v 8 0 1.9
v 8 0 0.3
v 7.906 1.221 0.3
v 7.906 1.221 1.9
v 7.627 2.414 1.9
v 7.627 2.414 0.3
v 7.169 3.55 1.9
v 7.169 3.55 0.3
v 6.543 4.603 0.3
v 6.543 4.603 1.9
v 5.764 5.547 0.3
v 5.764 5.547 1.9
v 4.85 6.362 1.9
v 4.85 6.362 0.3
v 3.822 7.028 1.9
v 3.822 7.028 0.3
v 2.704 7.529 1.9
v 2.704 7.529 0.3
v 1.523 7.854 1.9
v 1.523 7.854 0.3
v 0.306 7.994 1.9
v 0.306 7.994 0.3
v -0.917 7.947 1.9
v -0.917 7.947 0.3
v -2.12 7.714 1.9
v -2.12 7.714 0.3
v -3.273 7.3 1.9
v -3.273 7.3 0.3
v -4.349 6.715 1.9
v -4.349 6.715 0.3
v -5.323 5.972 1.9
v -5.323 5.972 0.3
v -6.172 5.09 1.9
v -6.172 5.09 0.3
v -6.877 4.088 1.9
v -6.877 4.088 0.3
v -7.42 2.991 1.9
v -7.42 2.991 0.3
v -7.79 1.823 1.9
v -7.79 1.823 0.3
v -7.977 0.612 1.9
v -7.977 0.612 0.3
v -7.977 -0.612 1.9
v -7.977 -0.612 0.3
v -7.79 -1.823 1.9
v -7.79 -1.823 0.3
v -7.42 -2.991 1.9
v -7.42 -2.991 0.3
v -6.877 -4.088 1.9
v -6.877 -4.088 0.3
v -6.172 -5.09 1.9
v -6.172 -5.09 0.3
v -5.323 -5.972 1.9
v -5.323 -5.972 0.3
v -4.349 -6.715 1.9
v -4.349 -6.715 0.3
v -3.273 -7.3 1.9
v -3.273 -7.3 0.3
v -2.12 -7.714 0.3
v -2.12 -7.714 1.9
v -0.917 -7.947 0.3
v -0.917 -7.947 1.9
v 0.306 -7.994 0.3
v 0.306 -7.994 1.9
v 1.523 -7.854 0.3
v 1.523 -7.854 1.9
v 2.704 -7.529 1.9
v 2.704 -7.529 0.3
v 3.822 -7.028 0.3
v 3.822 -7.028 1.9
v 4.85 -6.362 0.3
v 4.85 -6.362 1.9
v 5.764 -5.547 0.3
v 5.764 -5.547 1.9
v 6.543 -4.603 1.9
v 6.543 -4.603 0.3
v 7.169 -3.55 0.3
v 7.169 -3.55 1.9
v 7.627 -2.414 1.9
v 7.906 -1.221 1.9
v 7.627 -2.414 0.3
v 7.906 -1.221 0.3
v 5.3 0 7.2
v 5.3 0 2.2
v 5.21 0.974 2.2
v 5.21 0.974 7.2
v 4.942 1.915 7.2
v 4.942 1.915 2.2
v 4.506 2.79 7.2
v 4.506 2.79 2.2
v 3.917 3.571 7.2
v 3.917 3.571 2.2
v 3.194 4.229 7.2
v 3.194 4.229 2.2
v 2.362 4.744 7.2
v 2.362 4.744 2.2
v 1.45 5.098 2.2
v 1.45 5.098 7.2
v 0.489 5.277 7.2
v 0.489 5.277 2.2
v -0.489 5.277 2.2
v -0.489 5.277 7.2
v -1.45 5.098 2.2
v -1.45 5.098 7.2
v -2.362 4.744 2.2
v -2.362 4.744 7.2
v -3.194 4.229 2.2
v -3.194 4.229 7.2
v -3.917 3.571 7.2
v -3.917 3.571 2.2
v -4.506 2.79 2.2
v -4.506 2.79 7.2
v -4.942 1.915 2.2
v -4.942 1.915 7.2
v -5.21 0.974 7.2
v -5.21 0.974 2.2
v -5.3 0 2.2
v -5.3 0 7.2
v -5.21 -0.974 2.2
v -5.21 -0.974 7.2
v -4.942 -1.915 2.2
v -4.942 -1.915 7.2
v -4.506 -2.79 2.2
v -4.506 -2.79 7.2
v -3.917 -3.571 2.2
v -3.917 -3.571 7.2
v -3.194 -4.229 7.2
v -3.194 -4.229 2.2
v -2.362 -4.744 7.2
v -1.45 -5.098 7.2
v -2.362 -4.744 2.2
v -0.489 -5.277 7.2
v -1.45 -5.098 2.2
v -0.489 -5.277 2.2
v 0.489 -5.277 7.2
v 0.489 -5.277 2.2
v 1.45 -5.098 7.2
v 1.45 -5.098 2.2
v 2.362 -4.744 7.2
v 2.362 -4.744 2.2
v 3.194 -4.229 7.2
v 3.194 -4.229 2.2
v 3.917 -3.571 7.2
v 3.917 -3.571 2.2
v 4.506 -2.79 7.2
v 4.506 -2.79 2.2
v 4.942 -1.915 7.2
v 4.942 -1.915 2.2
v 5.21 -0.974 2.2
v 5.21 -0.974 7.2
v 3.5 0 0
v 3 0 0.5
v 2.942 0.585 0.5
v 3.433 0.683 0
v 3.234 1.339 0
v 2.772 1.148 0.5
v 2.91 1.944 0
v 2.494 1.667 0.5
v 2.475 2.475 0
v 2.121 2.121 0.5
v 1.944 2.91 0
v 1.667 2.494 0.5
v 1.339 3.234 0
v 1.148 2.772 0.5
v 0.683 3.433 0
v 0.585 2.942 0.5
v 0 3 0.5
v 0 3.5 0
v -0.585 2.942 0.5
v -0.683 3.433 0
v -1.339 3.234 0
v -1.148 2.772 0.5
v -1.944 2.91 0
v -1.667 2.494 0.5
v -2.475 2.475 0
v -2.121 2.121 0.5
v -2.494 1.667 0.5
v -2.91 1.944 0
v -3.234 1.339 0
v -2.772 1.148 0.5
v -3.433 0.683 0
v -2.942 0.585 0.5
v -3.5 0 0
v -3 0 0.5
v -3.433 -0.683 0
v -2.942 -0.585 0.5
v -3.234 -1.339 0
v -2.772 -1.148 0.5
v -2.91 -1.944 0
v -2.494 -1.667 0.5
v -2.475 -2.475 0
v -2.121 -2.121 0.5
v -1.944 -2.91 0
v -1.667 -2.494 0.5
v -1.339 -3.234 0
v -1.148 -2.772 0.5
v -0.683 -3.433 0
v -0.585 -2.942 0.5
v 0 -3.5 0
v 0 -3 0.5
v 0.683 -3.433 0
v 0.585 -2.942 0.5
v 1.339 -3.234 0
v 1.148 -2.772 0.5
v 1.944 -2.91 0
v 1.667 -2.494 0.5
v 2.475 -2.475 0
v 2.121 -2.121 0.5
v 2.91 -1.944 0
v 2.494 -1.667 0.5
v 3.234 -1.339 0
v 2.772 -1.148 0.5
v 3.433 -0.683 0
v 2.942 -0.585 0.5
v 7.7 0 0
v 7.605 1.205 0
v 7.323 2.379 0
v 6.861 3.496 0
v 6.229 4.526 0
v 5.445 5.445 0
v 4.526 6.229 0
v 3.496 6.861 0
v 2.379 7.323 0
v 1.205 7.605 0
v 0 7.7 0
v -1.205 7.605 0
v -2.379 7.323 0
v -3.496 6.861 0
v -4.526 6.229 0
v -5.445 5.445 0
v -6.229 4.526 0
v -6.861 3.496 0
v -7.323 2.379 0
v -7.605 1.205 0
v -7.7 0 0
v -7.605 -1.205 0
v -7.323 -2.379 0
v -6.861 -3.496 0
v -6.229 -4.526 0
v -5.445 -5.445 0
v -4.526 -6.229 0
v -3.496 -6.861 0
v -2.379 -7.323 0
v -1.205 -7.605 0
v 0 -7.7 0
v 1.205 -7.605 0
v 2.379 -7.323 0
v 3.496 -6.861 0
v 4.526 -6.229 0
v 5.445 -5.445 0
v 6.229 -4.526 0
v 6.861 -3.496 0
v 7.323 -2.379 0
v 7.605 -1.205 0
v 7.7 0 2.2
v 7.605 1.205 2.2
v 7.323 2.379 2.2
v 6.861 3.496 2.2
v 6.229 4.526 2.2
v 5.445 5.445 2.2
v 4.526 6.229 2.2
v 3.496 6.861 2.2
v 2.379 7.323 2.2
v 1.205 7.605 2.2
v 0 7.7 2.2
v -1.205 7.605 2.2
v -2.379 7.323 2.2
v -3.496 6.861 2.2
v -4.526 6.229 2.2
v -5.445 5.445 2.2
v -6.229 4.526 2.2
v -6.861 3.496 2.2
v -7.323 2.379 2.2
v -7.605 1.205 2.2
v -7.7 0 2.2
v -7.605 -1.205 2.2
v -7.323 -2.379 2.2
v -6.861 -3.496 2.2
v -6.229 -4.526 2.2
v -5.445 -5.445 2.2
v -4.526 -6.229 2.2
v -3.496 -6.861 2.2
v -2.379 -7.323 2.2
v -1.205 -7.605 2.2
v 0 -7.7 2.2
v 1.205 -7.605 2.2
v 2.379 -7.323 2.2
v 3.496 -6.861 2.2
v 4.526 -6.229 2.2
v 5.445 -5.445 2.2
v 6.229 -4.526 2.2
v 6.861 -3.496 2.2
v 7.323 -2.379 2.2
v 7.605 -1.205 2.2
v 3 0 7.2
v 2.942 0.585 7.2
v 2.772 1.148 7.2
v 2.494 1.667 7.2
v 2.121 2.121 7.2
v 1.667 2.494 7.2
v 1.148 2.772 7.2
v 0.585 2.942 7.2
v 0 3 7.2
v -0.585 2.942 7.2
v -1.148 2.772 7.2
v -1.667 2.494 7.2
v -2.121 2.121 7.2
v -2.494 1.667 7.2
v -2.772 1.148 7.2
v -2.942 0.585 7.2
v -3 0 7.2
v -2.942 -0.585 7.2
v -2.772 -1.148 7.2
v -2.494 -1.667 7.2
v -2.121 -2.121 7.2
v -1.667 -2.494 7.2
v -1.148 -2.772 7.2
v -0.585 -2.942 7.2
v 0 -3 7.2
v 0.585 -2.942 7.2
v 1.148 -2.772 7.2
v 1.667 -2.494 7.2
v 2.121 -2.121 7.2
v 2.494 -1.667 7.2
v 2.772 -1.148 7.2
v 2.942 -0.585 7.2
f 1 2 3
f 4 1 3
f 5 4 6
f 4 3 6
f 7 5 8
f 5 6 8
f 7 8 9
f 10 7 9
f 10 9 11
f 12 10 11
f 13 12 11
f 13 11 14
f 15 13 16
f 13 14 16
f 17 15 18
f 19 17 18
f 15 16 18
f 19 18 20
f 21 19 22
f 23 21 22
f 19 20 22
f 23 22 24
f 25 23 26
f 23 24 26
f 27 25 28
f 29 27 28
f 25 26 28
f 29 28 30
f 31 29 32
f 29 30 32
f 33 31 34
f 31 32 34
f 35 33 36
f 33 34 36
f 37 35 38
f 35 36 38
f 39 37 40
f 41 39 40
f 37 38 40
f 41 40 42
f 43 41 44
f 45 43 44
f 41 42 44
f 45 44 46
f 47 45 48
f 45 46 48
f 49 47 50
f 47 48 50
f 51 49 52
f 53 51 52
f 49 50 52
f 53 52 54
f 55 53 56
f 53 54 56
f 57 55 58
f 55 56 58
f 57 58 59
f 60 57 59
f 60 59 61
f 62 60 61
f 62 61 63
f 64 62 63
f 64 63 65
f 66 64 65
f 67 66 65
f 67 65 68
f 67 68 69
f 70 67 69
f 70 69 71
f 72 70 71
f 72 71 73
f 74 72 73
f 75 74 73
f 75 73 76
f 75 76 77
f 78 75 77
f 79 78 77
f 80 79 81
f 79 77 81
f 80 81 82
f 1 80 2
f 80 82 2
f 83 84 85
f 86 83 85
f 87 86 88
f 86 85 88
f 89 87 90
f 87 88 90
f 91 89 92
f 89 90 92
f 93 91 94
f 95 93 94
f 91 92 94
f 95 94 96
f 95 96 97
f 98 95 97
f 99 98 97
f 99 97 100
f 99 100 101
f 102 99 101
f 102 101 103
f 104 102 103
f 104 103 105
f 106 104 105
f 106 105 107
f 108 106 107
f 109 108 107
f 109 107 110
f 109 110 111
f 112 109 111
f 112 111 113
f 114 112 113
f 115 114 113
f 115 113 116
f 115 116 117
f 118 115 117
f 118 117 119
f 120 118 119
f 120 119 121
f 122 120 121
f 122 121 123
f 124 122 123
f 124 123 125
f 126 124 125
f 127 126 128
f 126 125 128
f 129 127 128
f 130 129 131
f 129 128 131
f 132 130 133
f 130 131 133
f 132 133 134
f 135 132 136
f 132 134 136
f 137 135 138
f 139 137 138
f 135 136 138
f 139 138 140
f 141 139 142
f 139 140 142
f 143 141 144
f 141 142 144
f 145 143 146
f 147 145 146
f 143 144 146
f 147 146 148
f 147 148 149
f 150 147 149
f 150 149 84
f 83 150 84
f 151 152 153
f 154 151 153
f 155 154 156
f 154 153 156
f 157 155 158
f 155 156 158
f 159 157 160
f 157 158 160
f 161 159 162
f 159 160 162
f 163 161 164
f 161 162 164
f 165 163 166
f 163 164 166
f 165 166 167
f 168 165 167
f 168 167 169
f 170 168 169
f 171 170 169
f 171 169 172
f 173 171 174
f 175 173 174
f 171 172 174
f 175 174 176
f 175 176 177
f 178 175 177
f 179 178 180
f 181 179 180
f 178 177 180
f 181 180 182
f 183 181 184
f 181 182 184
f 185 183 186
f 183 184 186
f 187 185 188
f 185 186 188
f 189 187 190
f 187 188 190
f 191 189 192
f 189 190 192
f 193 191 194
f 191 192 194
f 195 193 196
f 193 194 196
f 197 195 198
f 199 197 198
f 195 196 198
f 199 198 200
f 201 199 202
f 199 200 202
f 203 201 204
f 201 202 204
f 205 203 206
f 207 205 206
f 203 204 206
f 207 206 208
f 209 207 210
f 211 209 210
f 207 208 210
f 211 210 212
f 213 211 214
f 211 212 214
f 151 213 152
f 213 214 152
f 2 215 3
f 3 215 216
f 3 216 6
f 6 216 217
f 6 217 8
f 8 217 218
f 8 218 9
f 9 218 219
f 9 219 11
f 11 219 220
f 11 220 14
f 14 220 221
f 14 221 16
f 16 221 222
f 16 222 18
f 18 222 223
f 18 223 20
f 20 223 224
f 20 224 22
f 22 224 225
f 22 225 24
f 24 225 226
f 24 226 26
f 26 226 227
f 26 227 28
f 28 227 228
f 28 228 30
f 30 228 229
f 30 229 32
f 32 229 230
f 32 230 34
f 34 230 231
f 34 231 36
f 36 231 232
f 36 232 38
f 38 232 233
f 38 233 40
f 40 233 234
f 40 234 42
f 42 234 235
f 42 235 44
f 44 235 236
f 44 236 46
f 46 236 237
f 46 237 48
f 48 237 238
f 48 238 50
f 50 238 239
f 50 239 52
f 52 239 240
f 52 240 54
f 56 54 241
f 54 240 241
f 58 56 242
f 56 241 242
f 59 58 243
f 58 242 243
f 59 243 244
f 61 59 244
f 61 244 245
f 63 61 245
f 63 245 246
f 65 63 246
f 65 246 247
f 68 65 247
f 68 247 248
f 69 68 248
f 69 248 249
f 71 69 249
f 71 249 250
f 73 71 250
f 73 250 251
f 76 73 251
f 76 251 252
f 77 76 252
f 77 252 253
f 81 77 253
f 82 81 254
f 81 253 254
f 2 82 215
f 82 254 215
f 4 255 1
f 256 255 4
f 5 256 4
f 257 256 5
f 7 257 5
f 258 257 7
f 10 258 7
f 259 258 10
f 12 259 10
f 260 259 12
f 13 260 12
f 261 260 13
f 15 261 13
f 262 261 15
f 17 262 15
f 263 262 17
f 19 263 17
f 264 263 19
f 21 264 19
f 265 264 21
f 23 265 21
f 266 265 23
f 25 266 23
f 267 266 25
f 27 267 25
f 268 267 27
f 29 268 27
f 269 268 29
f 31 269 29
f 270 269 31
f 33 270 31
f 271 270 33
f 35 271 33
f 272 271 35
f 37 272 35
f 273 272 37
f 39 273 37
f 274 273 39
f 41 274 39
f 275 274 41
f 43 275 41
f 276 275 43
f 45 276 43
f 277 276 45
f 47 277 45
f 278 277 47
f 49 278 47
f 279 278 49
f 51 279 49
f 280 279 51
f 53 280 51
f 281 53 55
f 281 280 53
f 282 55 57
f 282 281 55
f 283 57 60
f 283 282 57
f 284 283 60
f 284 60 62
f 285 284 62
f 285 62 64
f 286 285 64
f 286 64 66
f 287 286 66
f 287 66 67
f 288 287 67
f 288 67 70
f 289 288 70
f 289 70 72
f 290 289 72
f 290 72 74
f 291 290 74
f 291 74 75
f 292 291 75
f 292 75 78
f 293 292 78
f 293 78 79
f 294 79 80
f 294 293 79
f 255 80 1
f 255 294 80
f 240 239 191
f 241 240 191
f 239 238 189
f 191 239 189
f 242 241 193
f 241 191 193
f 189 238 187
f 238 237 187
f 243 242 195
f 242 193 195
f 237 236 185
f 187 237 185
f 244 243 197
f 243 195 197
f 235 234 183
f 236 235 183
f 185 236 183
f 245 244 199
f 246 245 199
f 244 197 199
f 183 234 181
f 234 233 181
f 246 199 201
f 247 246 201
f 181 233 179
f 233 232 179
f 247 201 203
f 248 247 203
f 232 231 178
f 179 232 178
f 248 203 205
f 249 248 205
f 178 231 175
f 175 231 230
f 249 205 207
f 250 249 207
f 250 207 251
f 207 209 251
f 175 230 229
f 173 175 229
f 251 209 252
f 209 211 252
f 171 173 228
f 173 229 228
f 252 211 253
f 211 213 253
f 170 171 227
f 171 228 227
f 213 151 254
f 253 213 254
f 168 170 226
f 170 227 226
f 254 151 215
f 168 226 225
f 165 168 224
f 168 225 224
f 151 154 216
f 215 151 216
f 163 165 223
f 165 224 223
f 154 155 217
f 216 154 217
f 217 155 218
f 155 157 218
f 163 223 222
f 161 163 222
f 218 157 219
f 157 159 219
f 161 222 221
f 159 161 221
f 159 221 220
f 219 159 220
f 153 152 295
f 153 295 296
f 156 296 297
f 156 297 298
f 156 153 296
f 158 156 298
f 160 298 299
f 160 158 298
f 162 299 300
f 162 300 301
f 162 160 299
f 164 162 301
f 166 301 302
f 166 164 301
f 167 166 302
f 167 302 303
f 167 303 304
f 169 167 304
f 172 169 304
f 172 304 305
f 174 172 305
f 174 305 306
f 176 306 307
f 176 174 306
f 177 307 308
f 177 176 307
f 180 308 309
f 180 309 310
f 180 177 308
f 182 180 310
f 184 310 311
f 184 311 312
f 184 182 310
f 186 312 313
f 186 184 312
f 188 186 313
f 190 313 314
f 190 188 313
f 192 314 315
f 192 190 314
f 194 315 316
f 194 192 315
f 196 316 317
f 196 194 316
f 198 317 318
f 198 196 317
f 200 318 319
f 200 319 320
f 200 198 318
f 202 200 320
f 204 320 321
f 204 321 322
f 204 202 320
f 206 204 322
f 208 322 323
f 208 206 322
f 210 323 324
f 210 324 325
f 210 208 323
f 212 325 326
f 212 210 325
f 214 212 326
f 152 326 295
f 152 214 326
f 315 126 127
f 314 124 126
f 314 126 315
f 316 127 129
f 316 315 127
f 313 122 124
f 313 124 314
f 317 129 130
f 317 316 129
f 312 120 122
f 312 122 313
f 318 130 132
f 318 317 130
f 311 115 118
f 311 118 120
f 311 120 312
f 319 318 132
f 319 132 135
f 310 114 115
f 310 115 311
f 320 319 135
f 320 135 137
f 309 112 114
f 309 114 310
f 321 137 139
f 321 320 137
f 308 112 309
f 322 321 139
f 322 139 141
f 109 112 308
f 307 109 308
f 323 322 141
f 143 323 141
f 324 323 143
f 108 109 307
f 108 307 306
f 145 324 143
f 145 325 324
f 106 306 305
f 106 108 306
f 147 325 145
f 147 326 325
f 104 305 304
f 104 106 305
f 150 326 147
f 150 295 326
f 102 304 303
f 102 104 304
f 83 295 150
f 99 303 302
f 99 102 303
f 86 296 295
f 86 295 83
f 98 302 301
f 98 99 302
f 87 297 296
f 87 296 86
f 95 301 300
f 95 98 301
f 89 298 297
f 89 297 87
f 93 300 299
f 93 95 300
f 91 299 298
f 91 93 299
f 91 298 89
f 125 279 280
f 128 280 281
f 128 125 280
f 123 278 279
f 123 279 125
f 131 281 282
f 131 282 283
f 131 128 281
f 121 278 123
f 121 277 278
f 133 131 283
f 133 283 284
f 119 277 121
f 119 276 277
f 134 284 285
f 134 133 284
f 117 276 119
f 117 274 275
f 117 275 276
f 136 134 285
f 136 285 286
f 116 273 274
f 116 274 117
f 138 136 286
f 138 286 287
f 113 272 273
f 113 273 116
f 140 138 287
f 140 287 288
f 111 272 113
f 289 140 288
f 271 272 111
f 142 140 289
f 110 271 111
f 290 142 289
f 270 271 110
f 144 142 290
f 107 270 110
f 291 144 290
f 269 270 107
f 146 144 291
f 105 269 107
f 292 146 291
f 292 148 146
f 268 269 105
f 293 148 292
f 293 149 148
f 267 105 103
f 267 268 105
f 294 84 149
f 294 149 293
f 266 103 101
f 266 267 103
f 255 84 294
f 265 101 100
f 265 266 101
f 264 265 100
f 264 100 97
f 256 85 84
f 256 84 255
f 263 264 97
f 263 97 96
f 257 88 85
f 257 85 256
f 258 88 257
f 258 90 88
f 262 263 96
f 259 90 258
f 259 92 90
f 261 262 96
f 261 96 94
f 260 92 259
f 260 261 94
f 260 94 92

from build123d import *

# Parameters (mm, degrees)
F0_R     = 5.3
F0_R_2   = 3
F1_DEPTH = 7.2
F0_R_3   = 8
F2_DEPTH = 2.2
F3_SIZE  = 0.5
F4_SIZE  = 0.3
F5_SIZE  = 0.3


with BuildPart() as f1:
    # F0 (on Top) → F1 (new body)
    with BuildSketch(Plane.XY):
        Circle(F0_R)
        Circle(F0_R_2, mode=Mode.SUBTRACT)
    extrude(amount=F1_DEPTH)

    # F0 (on Top) → F2 (join)
    with BuildSketch(Plane.XY):
        Circle(F0_R_3)
        Circle(F0_R, mode=Mode.SUBTRACT)
    extrude(amount=F2_DEPTH)

    # F3
    f3_edges = [f1.edges().sort_by_distance(p)[0] for p in [
        (-3, 0, 0),
    ]]
    chamfer(f3_edges, length=F3_SIZE)

    # F4
    f4_edges = [f1.edges().sort_by_distance(p)[0] for p in [
        (-8, 0, 2.2),
    ]]
    chamfer(f4_edges, length=F4_SIZE)

    # F5
    f5_edges = [f1.edges().sort_by_distance(p)[0] for p in [
        (-8, 0, 0),
    ]]
    chamfer(f5_edges, length=F5_SIZE)


solid = f1.part
